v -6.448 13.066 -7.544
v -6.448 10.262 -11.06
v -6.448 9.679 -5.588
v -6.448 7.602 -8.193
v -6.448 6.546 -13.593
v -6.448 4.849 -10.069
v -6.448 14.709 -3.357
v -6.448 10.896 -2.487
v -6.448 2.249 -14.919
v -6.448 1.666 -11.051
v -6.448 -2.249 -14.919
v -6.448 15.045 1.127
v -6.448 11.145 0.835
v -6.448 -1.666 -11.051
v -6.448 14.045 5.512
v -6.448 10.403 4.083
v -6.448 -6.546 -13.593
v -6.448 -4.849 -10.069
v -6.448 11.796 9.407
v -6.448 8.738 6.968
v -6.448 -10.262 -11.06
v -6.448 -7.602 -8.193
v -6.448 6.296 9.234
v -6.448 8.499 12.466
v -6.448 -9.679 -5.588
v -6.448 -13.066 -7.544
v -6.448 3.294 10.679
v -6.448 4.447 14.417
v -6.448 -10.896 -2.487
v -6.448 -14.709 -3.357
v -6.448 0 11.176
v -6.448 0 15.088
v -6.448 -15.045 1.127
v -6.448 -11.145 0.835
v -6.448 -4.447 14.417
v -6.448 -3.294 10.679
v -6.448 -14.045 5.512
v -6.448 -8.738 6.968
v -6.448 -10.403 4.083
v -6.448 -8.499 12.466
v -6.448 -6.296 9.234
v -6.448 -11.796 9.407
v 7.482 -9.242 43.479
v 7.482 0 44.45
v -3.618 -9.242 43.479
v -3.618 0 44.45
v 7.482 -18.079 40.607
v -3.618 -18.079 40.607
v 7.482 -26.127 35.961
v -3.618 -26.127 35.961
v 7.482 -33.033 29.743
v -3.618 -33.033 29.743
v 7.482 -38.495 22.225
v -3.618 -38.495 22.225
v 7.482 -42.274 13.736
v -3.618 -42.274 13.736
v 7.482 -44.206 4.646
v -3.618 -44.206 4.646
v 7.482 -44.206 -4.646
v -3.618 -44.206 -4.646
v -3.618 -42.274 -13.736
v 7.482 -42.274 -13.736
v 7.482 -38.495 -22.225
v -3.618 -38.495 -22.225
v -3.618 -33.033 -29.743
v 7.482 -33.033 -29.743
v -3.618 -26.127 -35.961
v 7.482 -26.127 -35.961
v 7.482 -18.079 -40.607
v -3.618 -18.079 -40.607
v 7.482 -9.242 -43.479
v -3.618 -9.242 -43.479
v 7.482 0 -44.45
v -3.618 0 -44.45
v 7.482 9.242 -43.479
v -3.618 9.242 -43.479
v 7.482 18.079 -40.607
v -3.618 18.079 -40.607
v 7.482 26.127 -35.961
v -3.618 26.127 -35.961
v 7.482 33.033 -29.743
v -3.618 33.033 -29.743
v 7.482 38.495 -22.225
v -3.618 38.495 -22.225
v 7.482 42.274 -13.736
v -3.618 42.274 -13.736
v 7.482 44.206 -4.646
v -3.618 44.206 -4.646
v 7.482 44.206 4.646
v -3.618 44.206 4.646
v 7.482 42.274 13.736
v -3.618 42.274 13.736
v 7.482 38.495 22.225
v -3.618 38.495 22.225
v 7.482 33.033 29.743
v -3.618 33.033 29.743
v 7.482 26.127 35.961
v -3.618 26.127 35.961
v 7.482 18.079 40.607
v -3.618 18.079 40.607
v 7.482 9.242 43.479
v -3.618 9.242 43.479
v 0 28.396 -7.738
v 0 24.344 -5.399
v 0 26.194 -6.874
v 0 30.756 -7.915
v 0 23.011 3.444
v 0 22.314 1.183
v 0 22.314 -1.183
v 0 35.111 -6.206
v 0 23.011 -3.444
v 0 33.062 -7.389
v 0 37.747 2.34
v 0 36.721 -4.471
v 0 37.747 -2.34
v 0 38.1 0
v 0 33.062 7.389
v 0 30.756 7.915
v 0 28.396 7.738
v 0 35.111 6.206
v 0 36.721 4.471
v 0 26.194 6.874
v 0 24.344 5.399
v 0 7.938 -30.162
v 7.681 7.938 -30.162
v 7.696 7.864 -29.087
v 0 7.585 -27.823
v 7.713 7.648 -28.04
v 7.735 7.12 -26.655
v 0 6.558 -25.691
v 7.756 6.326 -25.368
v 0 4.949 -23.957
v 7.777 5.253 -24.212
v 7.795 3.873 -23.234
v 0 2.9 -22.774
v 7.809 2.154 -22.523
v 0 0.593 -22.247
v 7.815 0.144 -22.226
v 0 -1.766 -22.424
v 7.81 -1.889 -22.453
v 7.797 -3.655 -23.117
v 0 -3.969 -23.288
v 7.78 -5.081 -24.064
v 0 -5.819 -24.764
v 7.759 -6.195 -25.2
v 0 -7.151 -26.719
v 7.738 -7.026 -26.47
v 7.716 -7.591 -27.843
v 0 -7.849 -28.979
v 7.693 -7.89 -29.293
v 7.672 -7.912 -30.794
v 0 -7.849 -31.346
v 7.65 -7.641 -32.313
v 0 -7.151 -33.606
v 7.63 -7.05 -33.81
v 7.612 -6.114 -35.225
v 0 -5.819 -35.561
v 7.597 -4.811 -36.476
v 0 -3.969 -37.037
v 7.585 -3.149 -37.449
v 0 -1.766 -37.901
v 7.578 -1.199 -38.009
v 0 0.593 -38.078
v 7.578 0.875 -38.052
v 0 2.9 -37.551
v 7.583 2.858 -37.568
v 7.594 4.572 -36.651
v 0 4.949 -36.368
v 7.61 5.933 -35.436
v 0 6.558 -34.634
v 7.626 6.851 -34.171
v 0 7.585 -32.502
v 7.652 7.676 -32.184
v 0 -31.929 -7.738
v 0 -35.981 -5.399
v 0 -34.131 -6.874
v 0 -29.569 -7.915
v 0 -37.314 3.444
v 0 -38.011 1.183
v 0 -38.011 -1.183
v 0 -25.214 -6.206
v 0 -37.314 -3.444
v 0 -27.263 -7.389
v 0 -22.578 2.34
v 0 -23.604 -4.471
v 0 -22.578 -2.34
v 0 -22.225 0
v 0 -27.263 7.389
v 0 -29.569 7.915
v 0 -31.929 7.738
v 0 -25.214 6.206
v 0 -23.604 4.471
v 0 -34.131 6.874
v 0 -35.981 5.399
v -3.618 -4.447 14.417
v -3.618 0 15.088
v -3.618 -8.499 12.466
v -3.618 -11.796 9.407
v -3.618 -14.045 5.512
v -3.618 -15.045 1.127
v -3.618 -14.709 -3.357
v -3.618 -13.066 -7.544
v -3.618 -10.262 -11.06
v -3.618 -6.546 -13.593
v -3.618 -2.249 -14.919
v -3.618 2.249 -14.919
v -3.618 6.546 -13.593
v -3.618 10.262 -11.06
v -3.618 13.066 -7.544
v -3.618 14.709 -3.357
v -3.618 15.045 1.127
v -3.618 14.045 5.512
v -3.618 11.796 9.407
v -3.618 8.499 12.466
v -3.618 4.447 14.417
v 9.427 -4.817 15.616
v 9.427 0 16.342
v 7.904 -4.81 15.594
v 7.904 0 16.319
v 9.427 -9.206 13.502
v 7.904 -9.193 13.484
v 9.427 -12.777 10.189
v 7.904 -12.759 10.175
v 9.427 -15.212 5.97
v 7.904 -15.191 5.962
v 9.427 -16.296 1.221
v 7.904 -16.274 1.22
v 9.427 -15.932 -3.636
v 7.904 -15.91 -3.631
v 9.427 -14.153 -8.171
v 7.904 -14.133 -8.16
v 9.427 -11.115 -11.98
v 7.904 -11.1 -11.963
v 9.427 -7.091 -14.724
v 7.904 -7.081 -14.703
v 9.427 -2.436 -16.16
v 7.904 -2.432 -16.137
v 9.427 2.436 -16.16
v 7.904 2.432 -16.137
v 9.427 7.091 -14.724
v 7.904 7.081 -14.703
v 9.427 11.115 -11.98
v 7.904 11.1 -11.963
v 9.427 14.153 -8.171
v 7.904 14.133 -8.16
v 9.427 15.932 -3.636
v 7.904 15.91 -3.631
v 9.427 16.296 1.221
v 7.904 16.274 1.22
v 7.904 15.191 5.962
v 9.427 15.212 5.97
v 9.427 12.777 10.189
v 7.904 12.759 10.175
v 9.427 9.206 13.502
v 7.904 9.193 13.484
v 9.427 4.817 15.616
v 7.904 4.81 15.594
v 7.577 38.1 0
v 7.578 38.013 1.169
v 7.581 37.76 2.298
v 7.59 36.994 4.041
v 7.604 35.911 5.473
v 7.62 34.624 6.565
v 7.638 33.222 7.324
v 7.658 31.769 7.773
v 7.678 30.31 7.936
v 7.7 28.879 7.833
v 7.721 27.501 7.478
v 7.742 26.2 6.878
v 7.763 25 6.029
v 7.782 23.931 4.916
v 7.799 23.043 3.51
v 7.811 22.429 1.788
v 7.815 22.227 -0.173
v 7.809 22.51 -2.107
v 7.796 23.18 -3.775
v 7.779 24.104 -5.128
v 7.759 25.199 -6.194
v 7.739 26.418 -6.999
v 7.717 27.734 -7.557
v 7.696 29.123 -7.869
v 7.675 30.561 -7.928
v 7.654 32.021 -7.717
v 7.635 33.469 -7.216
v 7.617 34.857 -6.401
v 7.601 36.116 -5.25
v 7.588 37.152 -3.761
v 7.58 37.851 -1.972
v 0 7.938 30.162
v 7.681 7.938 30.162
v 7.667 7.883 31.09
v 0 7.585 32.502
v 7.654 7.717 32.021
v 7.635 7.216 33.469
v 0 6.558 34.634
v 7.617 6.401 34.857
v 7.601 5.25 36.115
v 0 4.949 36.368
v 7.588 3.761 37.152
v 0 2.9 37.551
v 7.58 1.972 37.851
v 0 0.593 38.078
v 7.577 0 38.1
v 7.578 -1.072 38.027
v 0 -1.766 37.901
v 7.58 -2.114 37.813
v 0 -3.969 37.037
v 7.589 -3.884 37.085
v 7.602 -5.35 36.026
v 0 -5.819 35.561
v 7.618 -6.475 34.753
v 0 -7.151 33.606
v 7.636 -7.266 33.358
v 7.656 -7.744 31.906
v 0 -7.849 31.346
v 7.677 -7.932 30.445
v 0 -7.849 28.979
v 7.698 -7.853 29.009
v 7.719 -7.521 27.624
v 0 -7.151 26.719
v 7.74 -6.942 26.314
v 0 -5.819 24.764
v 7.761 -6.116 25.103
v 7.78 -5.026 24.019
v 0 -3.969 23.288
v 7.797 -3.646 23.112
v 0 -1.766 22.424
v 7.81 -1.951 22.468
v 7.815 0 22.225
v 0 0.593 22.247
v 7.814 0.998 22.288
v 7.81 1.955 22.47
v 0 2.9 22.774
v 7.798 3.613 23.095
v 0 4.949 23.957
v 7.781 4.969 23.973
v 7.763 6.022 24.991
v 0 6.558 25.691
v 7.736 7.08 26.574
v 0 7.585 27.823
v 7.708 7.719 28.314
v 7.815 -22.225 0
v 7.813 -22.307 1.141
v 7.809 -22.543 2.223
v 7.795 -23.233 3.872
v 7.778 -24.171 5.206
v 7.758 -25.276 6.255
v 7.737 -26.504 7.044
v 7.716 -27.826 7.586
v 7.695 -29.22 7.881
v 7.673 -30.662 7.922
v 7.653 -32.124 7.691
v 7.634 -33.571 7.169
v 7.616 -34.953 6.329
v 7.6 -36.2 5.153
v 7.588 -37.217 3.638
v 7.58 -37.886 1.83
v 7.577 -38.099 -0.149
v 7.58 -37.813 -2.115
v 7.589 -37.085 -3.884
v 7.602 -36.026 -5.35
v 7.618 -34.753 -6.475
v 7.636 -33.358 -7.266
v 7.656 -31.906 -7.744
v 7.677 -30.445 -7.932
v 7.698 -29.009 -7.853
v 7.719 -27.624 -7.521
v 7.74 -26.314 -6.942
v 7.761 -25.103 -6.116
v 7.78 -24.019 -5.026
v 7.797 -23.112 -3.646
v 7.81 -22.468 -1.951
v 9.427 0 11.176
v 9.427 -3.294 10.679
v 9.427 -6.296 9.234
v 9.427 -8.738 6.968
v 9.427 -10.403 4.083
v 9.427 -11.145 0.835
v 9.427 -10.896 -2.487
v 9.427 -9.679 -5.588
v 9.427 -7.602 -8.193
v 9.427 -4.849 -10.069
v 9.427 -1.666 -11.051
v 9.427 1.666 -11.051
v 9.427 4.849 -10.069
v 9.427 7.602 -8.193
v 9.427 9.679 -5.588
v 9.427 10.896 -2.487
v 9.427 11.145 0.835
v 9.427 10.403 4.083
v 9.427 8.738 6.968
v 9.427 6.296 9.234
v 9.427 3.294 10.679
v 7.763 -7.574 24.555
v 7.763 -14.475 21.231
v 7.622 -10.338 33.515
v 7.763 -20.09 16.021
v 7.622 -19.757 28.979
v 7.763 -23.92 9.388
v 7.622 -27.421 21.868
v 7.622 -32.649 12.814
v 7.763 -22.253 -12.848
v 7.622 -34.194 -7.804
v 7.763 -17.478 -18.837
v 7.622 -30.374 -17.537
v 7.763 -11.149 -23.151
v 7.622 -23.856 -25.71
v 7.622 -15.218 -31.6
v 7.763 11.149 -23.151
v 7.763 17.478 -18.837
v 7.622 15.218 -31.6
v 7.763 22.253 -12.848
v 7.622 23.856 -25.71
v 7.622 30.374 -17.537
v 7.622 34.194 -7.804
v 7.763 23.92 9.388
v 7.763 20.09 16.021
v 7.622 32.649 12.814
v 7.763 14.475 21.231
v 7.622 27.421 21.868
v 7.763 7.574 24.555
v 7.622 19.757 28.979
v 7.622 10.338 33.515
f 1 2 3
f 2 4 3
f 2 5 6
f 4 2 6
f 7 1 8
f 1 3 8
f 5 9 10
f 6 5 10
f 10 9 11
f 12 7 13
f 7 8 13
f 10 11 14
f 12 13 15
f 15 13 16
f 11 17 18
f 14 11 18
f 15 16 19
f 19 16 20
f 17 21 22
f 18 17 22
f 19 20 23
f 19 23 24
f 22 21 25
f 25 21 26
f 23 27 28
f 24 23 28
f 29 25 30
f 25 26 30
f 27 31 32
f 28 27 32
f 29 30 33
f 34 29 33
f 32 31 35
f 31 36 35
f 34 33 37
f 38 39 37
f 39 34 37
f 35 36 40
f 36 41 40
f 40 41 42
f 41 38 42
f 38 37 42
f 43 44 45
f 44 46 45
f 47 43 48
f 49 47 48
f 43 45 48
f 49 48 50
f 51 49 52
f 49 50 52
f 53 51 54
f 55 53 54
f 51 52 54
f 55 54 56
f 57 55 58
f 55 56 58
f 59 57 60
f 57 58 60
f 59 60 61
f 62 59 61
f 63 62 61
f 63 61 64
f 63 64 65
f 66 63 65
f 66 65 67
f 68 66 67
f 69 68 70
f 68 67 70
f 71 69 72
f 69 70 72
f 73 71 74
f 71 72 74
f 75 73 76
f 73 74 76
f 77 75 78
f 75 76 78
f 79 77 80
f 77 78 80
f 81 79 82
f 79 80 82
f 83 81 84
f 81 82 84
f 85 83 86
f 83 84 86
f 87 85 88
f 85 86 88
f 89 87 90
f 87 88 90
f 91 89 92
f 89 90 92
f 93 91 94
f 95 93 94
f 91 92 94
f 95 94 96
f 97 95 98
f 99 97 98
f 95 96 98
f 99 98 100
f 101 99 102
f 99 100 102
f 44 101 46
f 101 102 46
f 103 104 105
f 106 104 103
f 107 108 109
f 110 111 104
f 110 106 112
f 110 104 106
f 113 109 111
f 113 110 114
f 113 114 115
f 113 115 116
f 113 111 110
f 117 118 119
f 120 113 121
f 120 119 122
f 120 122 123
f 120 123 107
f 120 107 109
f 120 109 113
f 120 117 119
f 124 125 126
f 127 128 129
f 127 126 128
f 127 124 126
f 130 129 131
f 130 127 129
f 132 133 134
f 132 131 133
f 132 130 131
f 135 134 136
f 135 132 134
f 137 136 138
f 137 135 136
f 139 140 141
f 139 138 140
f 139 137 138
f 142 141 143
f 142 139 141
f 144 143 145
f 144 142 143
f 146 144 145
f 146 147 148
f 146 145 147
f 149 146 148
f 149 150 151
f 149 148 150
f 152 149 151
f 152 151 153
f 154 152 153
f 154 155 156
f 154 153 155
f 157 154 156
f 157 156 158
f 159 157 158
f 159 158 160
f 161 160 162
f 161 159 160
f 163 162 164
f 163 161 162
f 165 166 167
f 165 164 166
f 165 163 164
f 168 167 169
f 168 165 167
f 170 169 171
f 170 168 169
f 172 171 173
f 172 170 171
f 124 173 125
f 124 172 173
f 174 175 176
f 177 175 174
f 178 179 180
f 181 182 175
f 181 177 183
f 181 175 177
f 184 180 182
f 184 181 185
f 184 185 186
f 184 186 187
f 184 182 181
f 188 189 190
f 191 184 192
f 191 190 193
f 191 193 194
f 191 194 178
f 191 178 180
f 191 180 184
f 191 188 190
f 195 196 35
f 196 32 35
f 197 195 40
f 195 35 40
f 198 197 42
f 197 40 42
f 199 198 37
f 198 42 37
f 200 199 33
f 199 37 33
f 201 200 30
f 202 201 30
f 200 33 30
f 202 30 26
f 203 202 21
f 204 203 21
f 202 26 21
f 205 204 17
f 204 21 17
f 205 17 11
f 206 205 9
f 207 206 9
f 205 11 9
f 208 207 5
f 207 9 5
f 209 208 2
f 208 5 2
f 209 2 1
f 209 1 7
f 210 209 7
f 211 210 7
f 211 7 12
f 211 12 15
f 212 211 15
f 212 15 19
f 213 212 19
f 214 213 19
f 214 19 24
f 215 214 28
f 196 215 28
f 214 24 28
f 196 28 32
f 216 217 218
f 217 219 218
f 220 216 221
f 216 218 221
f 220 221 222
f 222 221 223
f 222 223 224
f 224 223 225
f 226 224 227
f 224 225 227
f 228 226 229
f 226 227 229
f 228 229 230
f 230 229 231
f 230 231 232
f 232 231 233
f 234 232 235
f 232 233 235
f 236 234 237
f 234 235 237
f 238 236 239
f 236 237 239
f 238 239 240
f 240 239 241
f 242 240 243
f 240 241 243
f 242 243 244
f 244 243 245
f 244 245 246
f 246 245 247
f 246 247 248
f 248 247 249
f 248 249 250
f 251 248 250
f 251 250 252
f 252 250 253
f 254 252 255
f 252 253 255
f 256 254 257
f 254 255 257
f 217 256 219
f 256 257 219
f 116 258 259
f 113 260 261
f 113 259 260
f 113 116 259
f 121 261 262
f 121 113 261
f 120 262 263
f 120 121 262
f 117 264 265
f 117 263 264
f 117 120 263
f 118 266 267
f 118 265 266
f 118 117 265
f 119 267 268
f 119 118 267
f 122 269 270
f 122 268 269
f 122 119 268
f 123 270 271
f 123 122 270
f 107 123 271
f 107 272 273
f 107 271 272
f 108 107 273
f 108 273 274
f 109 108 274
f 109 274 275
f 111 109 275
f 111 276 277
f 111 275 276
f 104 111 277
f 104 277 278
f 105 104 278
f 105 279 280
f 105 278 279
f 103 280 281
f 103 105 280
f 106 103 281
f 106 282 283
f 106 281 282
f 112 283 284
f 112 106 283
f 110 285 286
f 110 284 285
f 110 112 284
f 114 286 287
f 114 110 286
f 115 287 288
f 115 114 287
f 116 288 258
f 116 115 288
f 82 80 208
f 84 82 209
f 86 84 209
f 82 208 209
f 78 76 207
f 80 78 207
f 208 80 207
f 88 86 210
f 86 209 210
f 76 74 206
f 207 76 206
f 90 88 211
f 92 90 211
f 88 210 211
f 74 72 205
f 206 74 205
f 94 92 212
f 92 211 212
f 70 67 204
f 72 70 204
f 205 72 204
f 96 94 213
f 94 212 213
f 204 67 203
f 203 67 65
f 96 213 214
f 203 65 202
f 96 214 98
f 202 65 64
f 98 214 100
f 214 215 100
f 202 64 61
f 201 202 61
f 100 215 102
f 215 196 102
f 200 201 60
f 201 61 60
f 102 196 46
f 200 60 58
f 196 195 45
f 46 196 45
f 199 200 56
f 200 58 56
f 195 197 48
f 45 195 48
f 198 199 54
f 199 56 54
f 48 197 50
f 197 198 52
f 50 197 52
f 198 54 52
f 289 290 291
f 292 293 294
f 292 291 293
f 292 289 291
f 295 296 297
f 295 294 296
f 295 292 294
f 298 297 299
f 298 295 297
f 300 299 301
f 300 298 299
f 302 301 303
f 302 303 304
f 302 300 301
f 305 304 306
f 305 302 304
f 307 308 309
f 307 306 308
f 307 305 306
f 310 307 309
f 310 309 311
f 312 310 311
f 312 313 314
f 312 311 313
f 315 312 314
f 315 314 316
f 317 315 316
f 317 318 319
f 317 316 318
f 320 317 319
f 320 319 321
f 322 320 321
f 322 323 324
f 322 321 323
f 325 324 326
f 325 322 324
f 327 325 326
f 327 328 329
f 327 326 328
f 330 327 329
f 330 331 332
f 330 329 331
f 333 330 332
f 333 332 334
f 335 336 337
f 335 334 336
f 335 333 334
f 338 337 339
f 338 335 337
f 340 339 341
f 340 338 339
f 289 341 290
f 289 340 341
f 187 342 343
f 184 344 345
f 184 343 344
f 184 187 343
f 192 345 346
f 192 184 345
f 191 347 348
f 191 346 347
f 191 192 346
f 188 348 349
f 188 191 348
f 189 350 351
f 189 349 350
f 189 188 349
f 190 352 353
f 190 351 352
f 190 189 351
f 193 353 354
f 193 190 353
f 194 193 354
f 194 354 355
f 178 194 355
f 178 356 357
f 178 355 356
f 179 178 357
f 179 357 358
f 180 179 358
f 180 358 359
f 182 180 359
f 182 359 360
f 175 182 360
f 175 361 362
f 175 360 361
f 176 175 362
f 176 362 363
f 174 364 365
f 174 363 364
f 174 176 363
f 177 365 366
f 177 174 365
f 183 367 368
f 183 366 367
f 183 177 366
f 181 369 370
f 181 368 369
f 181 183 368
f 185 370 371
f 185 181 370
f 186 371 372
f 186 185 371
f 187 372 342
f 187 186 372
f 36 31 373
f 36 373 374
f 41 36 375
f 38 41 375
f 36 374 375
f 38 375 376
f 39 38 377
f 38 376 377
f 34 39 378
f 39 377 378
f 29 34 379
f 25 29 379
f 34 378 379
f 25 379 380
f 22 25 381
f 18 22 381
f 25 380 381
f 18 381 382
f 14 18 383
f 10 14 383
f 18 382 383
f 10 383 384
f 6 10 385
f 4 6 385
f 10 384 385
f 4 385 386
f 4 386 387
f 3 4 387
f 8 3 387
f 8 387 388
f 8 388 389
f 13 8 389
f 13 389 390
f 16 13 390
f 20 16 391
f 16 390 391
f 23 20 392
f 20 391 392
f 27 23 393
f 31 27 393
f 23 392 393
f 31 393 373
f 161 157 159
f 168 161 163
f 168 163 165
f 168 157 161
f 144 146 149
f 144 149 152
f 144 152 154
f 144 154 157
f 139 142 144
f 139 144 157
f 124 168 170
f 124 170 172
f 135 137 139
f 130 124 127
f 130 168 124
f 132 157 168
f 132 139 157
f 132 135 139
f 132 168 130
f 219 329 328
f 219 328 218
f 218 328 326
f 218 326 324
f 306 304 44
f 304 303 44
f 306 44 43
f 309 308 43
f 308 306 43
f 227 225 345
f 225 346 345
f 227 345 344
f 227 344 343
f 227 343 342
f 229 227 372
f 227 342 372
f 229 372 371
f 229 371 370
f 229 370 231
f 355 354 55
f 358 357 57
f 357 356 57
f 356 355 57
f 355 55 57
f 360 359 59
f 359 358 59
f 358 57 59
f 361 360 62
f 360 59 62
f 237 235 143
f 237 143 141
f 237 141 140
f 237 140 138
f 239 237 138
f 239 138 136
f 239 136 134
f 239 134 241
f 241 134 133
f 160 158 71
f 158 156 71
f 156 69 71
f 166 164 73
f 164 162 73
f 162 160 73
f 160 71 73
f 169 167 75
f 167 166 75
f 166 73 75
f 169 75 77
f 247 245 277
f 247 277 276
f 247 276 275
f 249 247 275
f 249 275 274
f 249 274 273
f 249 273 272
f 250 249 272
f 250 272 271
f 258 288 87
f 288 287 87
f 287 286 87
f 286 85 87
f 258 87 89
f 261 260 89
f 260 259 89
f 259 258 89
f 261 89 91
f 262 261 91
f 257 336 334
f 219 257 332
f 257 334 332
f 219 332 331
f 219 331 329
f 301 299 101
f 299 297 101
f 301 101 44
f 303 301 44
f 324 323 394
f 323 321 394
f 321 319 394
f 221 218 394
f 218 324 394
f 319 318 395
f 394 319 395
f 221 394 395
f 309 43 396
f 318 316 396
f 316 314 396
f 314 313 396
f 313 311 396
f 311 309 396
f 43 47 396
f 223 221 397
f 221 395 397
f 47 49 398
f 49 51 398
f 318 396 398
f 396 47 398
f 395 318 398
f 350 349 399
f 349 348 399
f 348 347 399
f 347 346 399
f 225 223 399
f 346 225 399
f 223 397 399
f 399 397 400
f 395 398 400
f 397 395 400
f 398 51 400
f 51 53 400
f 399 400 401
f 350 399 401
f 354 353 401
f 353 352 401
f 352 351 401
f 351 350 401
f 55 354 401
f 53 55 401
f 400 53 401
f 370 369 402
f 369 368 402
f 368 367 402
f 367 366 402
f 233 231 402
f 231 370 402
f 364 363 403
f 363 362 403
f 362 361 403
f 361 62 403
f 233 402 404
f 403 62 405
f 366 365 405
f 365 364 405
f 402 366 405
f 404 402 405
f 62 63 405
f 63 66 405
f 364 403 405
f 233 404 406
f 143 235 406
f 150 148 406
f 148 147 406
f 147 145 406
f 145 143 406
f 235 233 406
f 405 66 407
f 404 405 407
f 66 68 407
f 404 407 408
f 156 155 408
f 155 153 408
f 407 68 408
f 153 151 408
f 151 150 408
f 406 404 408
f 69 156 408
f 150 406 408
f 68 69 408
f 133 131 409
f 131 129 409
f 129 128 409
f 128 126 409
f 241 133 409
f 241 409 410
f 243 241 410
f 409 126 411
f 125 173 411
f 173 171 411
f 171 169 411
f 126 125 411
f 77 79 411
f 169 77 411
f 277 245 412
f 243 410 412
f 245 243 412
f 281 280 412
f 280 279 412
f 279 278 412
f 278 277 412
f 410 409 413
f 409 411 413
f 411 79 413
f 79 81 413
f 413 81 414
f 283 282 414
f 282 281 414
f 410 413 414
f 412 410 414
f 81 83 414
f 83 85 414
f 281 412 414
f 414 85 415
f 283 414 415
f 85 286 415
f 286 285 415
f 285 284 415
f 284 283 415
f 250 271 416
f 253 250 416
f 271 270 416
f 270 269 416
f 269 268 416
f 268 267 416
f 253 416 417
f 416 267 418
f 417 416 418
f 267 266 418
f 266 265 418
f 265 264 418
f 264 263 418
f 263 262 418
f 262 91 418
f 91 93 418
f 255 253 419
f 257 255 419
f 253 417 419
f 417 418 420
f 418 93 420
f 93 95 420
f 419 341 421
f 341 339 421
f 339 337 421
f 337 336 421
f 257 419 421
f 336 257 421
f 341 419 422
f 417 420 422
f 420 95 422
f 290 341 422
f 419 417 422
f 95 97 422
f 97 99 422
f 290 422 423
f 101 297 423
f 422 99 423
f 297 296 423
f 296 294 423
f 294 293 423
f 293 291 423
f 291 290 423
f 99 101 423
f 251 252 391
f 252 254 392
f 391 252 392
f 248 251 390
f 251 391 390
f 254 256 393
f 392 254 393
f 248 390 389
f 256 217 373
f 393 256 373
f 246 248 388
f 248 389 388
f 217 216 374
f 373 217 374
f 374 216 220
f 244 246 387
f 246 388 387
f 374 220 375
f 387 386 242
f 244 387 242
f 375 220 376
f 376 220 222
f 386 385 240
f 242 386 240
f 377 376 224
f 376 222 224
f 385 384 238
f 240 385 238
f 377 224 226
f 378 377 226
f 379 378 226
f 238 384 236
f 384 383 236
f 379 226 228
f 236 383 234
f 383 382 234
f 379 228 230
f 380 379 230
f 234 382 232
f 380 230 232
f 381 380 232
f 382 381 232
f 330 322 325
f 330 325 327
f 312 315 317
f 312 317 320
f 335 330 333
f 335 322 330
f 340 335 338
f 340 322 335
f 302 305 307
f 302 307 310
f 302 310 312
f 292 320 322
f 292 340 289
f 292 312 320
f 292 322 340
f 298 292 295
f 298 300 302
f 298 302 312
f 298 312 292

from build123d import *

# Parameters (mm, degrees)
F2_R     = 7.9375
F3_DEPTH = 9.42848


with BuildPart() as f1:
    # F0 (on Front) → F1 (revolve)
    with BuildSketch(Plane.XZ):
        Polygon((-6.44752, 15.0876), (-6.44752, 11.176), (9.42748, 11.176), (9.42748, 16.34203), (7.903651, 16.319176), (7.48175, 44.45), (-3.61805, 44.45), (-3.61805, 15.0876), align=None)
    revolve(axis=Axis((0.264553, 0, 0), (1, 0, 0)))

    # F2 (on Right) → F3 (cut, through all)
    with BuildSketch(Plane.YZ):
        with Locations((0, 30.1625)):
            Circle(F2_R)
        with Locations((-30.1625, 0)):
            Circle(F2_R)
        with Locations((0, -30.1625)):
            Circle(F2_R)
        with Locations((30.1625, 0)):
            Circle(F2_R)
    extrude(amount=F3_DEPTH, mode=Mode.SUBTRACT)


solid = f1.part
